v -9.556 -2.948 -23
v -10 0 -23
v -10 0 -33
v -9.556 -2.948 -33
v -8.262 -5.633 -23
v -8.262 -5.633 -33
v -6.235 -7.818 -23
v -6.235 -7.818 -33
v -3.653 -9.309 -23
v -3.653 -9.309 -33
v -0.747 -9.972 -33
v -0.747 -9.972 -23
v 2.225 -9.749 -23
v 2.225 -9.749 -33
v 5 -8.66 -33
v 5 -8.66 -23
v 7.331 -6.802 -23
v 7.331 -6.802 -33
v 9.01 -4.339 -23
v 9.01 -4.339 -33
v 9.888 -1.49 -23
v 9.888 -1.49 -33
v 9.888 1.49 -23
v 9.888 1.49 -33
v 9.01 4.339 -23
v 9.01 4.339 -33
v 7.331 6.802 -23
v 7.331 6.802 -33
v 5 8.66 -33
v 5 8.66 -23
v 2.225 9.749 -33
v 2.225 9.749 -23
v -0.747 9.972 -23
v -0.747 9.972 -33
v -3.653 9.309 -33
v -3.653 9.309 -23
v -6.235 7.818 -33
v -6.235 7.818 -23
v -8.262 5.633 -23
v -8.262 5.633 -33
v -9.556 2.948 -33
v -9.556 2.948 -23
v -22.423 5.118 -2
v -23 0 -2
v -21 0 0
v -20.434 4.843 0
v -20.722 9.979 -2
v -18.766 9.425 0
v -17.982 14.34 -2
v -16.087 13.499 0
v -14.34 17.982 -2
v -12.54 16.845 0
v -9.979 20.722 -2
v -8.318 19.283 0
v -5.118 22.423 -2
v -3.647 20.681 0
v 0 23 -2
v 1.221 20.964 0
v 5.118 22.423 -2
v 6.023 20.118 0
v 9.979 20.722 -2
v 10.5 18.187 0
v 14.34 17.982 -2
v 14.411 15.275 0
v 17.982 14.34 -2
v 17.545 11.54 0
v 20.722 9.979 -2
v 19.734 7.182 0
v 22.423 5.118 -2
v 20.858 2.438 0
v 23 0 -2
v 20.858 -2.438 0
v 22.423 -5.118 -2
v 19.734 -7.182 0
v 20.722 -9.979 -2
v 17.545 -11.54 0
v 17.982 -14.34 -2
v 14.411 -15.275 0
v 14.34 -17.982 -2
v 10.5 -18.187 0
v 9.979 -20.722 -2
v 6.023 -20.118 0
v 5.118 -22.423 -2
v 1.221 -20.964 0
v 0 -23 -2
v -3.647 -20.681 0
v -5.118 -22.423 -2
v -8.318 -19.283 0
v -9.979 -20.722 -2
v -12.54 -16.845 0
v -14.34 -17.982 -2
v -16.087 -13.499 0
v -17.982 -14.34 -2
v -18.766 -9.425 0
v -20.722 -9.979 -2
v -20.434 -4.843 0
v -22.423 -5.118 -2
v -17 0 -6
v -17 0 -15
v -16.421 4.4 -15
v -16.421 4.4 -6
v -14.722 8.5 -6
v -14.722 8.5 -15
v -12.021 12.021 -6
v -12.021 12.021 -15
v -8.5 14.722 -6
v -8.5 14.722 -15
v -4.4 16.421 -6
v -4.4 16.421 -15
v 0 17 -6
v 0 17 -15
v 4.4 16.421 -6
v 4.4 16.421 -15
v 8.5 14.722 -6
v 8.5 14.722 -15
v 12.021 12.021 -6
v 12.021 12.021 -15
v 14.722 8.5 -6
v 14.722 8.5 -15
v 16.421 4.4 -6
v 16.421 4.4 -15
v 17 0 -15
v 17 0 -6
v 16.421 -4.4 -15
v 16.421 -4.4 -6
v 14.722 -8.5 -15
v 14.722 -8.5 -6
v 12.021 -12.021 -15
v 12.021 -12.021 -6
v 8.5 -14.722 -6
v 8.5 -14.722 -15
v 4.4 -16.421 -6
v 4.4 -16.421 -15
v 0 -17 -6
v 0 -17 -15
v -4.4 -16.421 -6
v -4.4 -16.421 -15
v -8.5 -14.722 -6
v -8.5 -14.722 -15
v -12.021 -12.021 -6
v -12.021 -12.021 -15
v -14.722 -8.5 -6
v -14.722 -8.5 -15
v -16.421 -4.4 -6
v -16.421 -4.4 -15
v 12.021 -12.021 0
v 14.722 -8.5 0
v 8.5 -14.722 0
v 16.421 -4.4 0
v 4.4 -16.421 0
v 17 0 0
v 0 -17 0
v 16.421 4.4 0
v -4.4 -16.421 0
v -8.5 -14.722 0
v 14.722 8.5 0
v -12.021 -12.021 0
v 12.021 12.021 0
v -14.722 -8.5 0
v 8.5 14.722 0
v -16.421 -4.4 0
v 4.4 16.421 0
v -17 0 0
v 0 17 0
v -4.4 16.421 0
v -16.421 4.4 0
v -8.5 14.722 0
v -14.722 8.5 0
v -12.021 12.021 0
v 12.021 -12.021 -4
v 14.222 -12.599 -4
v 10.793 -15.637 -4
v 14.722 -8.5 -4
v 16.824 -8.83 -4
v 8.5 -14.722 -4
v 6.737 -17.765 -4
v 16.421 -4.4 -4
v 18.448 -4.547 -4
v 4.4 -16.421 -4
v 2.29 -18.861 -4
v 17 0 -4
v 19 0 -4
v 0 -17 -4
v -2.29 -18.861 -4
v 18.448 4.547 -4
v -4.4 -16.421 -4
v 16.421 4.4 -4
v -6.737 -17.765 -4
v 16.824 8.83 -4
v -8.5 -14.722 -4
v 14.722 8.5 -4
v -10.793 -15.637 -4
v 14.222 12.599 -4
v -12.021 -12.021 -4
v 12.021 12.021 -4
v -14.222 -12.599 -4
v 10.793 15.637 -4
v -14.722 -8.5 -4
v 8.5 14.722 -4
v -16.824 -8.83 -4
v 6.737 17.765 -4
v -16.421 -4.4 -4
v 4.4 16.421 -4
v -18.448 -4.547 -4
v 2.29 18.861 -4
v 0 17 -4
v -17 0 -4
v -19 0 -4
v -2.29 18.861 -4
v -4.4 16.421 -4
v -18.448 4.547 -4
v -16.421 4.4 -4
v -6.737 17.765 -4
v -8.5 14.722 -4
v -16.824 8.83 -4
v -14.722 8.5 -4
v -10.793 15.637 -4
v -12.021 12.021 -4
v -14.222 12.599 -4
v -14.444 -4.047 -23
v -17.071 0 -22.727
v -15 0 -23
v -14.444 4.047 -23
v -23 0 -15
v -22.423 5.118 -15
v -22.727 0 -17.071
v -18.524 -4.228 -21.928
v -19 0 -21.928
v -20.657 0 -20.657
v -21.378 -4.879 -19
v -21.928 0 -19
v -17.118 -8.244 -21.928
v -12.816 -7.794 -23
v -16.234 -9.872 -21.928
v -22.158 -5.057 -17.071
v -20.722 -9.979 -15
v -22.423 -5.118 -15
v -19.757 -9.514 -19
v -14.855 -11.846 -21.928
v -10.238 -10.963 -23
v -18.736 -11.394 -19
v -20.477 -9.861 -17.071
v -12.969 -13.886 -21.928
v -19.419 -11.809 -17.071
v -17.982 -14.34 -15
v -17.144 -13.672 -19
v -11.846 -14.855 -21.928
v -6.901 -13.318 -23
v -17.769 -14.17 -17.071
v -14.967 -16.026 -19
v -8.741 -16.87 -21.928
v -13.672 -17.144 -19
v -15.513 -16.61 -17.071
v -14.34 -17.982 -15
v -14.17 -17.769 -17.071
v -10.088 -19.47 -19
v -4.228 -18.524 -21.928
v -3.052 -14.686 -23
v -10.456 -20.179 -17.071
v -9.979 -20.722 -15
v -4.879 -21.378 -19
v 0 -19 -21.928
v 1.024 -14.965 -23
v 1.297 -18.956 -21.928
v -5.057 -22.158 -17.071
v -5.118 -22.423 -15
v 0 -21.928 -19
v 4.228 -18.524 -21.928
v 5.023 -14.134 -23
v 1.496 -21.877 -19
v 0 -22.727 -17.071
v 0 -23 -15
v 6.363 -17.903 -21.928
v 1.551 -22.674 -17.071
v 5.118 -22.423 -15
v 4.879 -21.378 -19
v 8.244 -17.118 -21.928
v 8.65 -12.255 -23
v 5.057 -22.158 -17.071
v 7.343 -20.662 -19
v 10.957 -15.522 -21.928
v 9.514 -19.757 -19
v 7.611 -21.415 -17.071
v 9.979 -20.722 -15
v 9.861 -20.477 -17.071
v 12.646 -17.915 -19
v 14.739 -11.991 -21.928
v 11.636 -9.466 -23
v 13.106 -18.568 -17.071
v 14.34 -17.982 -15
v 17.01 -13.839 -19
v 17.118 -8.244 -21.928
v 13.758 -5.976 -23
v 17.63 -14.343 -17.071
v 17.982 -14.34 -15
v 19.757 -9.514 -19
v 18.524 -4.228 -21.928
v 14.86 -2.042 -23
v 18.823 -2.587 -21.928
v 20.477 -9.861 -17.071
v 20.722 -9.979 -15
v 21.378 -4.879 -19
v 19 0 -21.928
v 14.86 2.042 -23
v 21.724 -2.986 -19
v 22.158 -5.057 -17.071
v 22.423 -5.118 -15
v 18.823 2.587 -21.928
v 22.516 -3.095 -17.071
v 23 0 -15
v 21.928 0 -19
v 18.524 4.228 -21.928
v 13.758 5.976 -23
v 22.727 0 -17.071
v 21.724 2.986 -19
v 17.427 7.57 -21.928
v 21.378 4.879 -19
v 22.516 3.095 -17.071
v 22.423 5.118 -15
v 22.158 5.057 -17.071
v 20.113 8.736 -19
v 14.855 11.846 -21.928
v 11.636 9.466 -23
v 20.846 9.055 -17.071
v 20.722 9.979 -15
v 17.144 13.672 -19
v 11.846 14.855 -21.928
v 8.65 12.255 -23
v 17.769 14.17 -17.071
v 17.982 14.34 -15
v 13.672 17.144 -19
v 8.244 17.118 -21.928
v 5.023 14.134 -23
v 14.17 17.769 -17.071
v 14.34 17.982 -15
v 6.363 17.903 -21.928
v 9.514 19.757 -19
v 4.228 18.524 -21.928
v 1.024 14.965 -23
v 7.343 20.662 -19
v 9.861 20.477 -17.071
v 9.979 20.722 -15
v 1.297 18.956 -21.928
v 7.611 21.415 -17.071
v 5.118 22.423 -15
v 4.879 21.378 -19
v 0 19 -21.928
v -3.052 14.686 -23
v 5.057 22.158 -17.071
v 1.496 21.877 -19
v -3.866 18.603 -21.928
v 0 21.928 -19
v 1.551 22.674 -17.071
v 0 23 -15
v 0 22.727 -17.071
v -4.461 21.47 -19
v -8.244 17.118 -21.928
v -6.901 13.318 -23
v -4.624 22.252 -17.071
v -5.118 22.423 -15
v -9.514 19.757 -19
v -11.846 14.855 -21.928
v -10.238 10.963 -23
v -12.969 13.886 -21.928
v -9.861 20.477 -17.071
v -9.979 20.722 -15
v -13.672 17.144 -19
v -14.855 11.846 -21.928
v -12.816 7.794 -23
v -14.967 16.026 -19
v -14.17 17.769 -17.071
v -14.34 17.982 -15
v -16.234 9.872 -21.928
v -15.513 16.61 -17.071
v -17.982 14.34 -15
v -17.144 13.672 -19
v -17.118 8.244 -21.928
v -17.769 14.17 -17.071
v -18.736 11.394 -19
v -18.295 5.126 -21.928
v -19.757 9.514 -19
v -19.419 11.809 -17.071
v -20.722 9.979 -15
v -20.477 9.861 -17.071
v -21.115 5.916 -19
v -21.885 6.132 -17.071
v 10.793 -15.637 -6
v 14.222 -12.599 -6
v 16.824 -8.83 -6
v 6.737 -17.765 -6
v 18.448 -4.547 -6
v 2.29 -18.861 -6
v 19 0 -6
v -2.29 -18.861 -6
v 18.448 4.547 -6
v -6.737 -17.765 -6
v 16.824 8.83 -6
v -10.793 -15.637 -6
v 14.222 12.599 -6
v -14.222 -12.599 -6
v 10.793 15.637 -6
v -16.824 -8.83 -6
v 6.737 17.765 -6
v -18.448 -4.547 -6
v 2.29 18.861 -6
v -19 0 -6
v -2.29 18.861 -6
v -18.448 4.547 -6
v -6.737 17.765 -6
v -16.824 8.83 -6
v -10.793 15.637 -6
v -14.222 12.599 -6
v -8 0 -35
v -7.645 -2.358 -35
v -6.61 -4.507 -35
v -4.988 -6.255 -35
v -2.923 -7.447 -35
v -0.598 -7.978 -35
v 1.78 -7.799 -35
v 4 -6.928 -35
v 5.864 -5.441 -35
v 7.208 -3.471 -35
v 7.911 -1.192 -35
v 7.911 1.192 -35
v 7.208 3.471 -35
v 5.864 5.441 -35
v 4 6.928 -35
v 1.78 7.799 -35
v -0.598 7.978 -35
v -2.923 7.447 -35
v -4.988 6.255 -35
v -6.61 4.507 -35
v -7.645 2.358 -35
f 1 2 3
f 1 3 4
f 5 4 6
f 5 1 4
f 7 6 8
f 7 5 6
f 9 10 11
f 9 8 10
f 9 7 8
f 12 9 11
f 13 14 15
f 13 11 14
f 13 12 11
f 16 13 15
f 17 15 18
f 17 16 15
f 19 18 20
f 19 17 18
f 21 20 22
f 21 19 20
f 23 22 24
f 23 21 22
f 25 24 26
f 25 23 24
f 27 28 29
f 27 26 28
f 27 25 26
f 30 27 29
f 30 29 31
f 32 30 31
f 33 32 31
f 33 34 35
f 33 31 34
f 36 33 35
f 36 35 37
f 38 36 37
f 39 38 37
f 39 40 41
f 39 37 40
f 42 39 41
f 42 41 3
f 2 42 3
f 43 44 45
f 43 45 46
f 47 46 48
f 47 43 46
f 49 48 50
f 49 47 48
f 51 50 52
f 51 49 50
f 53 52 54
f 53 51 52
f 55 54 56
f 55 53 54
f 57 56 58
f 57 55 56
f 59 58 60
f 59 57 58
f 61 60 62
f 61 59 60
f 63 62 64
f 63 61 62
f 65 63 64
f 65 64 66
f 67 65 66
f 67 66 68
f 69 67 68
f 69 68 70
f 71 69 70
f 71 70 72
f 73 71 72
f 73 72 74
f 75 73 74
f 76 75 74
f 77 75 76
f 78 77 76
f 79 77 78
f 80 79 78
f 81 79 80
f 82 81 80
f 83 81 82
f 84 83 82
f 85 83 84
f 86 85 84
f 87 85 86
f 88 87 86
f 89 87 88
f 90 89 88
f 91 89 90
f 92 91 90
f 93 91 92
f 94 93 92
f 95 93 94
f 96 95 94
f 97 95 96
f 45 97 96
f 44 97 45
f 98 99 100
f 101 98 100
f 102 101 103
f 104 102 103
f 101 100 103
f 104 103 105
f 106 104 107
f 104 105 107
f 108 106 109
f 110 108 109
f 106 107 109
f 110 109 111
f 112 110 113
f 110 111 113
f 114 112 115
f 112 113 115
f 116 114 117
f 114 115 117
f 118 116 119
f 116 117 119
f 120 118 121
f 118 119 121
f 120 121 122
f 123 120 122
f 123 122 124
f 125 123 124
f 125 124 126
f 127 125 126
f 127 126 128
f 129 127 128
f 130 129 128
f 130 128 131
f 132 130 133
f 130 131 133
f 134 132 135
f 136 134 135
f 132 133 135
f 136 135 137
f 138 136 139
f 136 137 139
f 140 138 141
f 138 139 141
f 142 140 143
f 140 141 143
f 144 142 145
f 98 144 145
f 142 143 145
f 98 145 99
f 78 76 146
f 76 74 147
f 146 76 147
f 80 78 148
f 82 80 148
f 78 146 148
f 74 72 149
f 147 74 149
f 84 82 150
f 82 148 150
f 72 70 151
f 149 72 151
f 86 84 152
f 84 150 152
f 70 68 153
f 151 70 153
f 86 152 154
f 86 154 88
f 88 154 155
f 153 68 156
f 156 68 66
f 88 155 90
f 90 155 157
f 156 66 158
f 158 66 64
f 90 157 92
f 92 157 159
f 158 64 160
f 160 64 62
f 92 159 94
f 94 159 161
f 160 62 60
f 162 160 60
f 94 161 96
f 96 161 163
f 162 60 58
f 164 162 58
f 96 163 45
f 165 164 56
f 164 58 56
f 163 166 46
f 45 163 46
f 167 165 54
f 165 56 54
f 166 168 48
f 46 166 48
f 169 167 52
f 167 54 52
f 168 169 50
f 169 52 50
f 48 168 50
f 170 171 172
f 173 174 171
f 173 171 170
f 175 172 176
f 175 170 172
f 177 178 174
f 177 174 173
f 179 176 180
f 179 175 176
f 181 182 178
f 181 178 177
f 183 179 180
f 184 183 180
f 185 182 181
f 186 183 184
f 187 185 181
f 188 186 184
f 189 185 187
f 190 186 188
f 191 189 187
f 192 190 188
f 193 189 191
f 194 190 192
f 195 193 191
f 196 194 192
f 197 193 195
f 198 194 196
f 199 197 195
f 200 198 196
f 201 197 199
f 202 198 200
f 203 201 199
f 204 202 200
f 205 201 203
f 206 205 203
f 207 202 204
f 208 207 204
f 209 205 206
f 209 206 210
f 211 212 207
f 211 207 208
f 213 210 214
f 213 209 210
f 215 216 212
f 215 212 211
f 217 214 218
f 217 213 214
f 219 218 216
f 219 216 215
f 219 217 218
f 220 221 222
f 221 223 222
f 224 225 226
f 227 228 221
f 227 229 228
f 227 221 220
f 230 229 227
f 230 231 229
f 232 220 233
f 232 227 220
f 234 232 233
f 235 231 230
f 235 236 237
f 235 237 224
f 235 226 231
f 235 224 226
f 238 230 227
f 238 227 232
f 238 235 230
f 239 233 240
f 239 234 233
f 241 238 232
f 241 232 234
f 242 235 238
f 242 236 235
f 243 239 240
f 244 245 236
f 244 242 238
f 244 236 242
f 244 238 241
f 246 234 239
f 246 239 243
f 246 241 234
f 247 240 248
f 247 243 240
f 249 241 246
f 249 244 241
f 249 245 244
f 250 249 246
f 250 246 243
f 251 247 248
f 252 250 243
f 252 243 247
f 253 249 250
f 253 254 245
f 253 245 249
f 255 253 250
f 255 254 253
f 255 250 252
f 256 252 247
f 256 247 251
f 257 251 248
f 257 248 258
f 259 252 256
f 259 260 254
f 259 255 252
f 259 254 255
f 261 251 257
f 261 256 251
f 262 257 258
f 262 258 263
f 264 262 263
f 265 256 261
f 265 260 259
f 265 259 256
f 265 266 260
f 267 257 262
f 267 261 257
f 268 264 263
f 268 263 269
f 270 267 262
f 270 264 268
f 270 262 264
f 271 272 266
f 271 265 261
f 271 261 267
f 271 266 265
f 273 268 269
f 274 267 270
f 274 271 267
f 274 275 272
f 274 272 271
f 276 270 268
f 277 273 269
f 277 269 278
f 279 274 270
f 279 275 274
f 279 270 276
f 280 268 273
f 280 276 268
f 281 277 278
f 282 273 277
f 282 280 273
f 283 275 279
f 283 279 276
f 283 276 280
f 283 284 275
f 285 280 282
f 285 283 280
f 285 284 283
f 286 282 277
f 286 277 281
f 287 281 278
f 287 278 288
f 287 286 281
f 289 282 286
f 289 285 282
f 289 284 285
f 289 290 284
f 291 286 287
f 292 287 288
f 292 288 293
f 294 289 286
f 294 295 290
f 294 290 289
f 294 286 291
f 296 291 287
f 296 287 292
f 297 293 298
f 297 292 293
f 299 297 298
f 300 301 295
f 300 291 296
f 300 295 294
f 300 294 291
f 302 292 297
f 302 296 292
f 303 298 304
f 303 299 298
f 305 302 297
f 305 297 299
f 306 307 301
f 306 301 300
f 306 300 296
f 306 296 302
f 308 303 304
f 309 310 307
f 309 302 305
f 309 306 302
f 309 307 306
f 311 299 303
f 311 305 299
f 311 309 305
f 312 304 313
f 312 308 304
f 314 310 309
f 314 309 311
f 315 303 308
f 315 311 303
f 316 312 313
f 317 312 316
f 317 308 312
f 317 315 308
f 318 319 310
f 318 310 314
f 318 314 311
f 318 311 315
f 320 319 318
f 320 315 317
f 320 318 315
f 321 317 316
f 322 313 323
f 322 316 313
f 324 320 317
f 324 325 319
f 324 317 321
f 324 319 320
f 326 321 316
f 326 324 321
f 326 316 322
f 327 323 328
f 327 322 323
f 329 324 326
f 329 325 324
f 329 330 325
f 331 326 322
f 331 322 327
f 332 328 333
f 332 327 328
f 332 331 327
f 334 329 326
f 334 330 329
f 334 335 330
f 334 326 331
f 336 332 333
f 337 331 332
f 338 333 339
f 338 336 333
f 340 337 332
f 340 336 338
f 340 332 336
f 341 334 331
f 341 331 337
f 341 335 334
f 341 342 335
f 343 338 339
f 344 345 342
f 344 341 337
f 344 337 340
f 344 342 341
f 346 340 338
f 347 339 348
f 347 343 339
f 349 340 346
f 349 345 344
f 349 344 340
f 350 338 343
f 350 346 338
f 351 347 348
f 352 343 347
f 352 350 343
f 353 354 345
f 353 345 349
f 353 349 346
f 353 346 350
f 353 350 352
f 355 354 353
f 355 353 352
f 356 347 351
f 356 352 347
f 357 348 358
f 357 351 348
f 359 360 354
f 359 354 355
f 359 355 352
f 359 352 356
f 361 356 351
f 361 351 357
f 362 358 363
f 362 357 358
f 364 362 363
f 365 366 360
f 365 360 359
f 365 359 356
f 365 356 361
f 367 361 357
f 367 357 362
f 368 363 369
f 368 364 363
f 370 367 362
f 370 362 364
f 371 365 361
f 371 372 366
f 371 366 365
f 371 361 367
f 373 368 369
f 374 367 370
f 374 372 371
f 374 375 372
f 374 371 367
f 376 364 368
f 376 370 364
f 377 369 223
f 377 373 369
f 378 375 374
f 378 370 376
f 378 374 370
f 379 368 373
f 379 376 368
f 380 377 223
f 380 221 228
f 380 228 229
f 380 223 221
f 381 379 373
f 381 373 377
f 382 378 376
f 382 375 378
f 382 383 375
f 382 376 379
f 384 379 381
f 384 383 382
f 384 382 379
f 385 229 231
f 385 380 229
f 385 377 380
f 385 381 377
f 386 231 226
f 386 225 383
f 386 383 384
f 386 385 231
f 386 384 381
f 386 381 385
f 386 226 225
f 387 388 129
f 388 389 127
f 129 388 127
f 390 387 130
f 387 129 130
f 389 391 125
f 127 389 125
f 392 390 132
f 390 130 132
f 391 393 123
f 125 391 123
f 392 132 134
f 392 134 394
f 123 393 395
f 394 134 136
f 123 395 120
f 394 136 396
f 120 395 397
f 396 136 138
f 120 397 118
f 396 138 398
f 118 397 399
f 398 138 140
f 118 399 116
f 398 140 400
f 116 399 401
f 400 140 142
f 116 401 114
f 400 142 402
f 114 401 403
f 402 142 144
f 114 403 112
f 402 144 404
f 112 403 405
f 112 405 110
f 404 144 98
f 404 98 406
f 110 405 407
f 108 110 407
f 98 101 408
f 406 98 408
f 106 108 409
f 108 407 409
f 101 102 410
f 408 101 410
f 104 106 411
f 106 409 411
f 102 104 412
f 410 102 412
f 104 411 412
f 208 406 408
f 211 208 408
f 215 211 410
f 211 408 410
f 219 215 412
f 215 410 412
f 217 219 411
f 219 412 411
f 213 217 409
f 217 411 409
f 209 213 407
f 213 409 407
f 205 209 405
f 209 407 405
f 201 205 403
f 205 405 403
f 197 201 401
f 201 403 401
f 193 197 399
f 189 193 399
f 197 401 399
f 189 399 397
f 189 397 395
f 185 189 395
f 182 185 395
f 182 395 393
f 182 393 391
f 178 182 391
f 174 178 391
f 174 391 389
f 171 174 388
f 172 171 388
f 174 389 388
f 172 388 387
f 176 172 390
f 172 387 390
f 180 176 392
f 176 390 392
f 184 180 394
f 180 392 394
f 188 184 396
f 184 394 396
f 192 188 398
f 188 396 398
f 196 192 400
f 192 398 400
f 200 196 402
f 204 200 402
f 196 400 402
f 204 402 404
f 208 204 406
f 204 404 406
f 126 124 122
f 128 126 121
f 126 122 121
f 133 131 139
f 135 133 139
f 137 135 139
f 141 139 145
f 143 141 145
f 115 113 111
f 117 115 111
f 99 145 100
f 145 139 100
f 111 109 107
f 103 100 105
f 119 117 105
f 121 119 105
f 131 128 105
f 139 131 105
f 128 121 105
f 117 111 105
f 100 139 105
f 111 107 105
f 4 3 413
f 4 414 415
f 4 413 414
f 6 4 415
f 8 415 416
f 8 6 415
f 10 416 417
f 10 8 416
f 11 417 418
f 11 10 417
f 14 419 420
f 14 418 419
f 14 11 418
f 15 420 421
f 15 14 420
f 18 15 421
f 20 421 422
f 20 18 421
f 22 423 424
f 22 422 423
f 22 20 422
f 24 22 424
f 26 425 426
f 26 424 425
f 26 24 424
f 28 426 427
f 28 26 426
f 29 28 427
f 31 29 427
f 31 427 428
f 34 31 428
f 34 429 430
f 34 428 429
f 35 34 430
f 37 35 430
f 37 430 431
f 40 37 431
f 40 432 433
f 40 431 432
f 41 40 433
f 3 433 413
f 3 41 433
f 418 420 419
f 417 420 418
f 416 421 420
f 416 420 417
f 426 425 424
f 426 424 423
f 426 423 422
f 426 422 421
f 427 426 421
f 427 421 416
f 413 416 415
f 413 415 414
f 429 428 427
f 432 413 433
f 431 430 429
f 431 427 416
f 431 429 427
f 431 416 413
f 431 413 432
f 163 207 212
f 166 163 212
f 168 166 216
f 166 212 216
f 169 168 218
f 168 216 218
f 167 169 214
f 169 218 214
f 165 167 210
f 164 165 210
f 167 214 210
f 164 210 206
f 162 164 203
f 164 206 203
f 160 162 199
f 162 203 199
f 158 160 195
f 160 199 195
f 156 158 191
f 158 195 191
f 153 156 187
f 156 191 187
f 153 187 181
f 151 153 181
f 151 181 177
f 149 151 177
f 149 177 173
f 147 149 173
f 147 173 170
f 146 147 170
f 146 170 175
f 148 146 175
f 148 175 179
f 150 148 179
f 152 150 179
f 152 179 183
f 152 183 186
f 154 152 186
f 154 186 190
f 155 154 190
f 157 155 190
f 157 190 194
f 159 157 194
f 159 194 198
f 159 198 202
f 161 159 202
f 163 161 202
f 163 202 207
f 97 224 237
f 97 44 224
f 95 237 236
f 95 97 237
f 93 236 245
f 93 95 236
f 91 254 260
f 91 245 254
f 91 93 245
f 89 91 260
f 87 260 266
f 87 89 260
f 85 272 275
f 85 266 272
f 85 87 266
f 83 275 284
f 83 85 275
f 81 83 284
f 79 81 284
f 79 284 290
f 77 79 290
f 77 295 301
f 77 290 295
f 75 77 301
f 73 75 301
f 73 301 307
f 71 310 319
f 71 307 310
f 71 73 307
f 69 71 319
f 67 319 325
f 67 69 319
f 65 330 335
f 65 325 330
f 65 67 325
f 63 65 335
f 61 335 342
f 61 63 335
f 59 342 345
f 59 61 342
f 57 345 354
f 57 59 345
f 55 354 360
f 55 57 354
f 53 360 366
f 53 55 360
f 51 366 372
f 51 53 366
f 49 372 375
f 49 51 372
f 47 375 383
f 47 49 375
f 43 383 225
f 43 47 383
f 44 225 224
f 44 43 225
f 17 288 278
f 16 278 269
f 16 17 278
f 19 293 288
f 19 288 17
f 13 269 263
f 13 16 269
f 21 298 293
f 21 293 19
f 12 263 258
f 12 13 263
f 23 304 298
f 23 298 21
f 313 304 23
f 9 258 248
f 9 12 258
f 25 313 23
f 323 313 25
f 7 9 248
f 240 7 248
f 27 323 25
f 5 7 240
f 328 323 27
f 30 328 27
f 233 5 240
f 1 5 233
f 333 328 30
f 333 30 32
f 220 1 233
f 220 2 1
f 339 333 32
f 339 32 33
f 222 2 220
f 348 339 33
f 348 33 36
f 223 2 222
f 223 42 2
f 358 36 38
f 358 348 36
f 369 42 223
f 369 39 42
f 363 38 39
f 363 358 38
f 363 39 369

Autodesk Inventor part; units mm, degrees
ref_plane "YZ Plane" through (0, 0, 0) normal (1, 0, 0) x (0, 1, 0)
ref_plane "XZ Plane" through (0, 0, 0) normal (0, 1, 0) x (-1, 0, 0)
ref_plane "XY Plane" through (0, 0, 0) normal (0, 0, 1) x (1, 0, 0)
sketch "Boceto1" plane through (0, 0, 0) normal (0, 1, 0) x (-1, 0, 0)
  line L0 (0, 0) -> (17, 0) construction
  line L1 (17, -15) -> (0, -15)
  line L2 (0, -15) -> (0, -35)
  line L3 (0, -35) -> (8, -35)
  line L4 (10, -33) -> (10, -23)
  line L5 (10, -23) -> (15, -23)
  line L6 (23, -15) -> (23, -2)
  line L7 (8, -35) -> (10, -33)
  arc A0 (15, -23) -> (23, -15) centre (15, -15) ccw
  line L8 (21, 0) -> (17, 0)
  line L9 (23, -2) -> (21, 0)
  line L10 (17, 0) -> (17, -4) construction
  line L11 (17, -4) -> (19, -4)
  line L12 (19, -4) -> (19, -6)
  line L13 (19, -6) -> (17, -6)
  line L14 (17, 0) -> (17, -4)
  line L15 (17, -6) -> (17, -15)
  point P0 (10, -35)
  point P1 (23, 0)
  point P2 (23, 0)
  dimension "d2" = 17
  dimension "d4" = 2
  dimension "d5" = 45
  dimension "d11" = 8
  dimension "d13" = 23
  dimension "d14" = 10
  dimension "d15" = 10
  dimension "d17" = 15
  dimension "d18" = 2
  dimension "d19" = 45
  dimension "d20" = 35
  dimension "d21" = 4
  dimension "d22" = 2
  dimension "d23" = 2
  dimension "d24" = 9
revolve "Revolución1" add sketch "Boceto1" angle 360 about axis through (0, 0, -15) along (0, 0, -1)
equation "\"Radio_pliegue\" = Grosor"
equation "\"Anchura_desahogo_plegado\" = Grosor"
equation "\"Profundidad_desahogo_plegado\" = 0.5 * Grosor"
equation "\"Tamaño_destalonado\" = 4 * Grosor"
equation "\"Remanente_mínimo\" = 2 * Grosor"
equation "\"Radiodetransición\" = Radio_pliegue"
equation "\"Tamaño_de_radio_de_Jacobi\" = Radio_pliegue"
equation "\"TamañoSeparación\" = Grosor"
equation "\"Grosor\" = 0.5"
properties part number "Practica 5"
